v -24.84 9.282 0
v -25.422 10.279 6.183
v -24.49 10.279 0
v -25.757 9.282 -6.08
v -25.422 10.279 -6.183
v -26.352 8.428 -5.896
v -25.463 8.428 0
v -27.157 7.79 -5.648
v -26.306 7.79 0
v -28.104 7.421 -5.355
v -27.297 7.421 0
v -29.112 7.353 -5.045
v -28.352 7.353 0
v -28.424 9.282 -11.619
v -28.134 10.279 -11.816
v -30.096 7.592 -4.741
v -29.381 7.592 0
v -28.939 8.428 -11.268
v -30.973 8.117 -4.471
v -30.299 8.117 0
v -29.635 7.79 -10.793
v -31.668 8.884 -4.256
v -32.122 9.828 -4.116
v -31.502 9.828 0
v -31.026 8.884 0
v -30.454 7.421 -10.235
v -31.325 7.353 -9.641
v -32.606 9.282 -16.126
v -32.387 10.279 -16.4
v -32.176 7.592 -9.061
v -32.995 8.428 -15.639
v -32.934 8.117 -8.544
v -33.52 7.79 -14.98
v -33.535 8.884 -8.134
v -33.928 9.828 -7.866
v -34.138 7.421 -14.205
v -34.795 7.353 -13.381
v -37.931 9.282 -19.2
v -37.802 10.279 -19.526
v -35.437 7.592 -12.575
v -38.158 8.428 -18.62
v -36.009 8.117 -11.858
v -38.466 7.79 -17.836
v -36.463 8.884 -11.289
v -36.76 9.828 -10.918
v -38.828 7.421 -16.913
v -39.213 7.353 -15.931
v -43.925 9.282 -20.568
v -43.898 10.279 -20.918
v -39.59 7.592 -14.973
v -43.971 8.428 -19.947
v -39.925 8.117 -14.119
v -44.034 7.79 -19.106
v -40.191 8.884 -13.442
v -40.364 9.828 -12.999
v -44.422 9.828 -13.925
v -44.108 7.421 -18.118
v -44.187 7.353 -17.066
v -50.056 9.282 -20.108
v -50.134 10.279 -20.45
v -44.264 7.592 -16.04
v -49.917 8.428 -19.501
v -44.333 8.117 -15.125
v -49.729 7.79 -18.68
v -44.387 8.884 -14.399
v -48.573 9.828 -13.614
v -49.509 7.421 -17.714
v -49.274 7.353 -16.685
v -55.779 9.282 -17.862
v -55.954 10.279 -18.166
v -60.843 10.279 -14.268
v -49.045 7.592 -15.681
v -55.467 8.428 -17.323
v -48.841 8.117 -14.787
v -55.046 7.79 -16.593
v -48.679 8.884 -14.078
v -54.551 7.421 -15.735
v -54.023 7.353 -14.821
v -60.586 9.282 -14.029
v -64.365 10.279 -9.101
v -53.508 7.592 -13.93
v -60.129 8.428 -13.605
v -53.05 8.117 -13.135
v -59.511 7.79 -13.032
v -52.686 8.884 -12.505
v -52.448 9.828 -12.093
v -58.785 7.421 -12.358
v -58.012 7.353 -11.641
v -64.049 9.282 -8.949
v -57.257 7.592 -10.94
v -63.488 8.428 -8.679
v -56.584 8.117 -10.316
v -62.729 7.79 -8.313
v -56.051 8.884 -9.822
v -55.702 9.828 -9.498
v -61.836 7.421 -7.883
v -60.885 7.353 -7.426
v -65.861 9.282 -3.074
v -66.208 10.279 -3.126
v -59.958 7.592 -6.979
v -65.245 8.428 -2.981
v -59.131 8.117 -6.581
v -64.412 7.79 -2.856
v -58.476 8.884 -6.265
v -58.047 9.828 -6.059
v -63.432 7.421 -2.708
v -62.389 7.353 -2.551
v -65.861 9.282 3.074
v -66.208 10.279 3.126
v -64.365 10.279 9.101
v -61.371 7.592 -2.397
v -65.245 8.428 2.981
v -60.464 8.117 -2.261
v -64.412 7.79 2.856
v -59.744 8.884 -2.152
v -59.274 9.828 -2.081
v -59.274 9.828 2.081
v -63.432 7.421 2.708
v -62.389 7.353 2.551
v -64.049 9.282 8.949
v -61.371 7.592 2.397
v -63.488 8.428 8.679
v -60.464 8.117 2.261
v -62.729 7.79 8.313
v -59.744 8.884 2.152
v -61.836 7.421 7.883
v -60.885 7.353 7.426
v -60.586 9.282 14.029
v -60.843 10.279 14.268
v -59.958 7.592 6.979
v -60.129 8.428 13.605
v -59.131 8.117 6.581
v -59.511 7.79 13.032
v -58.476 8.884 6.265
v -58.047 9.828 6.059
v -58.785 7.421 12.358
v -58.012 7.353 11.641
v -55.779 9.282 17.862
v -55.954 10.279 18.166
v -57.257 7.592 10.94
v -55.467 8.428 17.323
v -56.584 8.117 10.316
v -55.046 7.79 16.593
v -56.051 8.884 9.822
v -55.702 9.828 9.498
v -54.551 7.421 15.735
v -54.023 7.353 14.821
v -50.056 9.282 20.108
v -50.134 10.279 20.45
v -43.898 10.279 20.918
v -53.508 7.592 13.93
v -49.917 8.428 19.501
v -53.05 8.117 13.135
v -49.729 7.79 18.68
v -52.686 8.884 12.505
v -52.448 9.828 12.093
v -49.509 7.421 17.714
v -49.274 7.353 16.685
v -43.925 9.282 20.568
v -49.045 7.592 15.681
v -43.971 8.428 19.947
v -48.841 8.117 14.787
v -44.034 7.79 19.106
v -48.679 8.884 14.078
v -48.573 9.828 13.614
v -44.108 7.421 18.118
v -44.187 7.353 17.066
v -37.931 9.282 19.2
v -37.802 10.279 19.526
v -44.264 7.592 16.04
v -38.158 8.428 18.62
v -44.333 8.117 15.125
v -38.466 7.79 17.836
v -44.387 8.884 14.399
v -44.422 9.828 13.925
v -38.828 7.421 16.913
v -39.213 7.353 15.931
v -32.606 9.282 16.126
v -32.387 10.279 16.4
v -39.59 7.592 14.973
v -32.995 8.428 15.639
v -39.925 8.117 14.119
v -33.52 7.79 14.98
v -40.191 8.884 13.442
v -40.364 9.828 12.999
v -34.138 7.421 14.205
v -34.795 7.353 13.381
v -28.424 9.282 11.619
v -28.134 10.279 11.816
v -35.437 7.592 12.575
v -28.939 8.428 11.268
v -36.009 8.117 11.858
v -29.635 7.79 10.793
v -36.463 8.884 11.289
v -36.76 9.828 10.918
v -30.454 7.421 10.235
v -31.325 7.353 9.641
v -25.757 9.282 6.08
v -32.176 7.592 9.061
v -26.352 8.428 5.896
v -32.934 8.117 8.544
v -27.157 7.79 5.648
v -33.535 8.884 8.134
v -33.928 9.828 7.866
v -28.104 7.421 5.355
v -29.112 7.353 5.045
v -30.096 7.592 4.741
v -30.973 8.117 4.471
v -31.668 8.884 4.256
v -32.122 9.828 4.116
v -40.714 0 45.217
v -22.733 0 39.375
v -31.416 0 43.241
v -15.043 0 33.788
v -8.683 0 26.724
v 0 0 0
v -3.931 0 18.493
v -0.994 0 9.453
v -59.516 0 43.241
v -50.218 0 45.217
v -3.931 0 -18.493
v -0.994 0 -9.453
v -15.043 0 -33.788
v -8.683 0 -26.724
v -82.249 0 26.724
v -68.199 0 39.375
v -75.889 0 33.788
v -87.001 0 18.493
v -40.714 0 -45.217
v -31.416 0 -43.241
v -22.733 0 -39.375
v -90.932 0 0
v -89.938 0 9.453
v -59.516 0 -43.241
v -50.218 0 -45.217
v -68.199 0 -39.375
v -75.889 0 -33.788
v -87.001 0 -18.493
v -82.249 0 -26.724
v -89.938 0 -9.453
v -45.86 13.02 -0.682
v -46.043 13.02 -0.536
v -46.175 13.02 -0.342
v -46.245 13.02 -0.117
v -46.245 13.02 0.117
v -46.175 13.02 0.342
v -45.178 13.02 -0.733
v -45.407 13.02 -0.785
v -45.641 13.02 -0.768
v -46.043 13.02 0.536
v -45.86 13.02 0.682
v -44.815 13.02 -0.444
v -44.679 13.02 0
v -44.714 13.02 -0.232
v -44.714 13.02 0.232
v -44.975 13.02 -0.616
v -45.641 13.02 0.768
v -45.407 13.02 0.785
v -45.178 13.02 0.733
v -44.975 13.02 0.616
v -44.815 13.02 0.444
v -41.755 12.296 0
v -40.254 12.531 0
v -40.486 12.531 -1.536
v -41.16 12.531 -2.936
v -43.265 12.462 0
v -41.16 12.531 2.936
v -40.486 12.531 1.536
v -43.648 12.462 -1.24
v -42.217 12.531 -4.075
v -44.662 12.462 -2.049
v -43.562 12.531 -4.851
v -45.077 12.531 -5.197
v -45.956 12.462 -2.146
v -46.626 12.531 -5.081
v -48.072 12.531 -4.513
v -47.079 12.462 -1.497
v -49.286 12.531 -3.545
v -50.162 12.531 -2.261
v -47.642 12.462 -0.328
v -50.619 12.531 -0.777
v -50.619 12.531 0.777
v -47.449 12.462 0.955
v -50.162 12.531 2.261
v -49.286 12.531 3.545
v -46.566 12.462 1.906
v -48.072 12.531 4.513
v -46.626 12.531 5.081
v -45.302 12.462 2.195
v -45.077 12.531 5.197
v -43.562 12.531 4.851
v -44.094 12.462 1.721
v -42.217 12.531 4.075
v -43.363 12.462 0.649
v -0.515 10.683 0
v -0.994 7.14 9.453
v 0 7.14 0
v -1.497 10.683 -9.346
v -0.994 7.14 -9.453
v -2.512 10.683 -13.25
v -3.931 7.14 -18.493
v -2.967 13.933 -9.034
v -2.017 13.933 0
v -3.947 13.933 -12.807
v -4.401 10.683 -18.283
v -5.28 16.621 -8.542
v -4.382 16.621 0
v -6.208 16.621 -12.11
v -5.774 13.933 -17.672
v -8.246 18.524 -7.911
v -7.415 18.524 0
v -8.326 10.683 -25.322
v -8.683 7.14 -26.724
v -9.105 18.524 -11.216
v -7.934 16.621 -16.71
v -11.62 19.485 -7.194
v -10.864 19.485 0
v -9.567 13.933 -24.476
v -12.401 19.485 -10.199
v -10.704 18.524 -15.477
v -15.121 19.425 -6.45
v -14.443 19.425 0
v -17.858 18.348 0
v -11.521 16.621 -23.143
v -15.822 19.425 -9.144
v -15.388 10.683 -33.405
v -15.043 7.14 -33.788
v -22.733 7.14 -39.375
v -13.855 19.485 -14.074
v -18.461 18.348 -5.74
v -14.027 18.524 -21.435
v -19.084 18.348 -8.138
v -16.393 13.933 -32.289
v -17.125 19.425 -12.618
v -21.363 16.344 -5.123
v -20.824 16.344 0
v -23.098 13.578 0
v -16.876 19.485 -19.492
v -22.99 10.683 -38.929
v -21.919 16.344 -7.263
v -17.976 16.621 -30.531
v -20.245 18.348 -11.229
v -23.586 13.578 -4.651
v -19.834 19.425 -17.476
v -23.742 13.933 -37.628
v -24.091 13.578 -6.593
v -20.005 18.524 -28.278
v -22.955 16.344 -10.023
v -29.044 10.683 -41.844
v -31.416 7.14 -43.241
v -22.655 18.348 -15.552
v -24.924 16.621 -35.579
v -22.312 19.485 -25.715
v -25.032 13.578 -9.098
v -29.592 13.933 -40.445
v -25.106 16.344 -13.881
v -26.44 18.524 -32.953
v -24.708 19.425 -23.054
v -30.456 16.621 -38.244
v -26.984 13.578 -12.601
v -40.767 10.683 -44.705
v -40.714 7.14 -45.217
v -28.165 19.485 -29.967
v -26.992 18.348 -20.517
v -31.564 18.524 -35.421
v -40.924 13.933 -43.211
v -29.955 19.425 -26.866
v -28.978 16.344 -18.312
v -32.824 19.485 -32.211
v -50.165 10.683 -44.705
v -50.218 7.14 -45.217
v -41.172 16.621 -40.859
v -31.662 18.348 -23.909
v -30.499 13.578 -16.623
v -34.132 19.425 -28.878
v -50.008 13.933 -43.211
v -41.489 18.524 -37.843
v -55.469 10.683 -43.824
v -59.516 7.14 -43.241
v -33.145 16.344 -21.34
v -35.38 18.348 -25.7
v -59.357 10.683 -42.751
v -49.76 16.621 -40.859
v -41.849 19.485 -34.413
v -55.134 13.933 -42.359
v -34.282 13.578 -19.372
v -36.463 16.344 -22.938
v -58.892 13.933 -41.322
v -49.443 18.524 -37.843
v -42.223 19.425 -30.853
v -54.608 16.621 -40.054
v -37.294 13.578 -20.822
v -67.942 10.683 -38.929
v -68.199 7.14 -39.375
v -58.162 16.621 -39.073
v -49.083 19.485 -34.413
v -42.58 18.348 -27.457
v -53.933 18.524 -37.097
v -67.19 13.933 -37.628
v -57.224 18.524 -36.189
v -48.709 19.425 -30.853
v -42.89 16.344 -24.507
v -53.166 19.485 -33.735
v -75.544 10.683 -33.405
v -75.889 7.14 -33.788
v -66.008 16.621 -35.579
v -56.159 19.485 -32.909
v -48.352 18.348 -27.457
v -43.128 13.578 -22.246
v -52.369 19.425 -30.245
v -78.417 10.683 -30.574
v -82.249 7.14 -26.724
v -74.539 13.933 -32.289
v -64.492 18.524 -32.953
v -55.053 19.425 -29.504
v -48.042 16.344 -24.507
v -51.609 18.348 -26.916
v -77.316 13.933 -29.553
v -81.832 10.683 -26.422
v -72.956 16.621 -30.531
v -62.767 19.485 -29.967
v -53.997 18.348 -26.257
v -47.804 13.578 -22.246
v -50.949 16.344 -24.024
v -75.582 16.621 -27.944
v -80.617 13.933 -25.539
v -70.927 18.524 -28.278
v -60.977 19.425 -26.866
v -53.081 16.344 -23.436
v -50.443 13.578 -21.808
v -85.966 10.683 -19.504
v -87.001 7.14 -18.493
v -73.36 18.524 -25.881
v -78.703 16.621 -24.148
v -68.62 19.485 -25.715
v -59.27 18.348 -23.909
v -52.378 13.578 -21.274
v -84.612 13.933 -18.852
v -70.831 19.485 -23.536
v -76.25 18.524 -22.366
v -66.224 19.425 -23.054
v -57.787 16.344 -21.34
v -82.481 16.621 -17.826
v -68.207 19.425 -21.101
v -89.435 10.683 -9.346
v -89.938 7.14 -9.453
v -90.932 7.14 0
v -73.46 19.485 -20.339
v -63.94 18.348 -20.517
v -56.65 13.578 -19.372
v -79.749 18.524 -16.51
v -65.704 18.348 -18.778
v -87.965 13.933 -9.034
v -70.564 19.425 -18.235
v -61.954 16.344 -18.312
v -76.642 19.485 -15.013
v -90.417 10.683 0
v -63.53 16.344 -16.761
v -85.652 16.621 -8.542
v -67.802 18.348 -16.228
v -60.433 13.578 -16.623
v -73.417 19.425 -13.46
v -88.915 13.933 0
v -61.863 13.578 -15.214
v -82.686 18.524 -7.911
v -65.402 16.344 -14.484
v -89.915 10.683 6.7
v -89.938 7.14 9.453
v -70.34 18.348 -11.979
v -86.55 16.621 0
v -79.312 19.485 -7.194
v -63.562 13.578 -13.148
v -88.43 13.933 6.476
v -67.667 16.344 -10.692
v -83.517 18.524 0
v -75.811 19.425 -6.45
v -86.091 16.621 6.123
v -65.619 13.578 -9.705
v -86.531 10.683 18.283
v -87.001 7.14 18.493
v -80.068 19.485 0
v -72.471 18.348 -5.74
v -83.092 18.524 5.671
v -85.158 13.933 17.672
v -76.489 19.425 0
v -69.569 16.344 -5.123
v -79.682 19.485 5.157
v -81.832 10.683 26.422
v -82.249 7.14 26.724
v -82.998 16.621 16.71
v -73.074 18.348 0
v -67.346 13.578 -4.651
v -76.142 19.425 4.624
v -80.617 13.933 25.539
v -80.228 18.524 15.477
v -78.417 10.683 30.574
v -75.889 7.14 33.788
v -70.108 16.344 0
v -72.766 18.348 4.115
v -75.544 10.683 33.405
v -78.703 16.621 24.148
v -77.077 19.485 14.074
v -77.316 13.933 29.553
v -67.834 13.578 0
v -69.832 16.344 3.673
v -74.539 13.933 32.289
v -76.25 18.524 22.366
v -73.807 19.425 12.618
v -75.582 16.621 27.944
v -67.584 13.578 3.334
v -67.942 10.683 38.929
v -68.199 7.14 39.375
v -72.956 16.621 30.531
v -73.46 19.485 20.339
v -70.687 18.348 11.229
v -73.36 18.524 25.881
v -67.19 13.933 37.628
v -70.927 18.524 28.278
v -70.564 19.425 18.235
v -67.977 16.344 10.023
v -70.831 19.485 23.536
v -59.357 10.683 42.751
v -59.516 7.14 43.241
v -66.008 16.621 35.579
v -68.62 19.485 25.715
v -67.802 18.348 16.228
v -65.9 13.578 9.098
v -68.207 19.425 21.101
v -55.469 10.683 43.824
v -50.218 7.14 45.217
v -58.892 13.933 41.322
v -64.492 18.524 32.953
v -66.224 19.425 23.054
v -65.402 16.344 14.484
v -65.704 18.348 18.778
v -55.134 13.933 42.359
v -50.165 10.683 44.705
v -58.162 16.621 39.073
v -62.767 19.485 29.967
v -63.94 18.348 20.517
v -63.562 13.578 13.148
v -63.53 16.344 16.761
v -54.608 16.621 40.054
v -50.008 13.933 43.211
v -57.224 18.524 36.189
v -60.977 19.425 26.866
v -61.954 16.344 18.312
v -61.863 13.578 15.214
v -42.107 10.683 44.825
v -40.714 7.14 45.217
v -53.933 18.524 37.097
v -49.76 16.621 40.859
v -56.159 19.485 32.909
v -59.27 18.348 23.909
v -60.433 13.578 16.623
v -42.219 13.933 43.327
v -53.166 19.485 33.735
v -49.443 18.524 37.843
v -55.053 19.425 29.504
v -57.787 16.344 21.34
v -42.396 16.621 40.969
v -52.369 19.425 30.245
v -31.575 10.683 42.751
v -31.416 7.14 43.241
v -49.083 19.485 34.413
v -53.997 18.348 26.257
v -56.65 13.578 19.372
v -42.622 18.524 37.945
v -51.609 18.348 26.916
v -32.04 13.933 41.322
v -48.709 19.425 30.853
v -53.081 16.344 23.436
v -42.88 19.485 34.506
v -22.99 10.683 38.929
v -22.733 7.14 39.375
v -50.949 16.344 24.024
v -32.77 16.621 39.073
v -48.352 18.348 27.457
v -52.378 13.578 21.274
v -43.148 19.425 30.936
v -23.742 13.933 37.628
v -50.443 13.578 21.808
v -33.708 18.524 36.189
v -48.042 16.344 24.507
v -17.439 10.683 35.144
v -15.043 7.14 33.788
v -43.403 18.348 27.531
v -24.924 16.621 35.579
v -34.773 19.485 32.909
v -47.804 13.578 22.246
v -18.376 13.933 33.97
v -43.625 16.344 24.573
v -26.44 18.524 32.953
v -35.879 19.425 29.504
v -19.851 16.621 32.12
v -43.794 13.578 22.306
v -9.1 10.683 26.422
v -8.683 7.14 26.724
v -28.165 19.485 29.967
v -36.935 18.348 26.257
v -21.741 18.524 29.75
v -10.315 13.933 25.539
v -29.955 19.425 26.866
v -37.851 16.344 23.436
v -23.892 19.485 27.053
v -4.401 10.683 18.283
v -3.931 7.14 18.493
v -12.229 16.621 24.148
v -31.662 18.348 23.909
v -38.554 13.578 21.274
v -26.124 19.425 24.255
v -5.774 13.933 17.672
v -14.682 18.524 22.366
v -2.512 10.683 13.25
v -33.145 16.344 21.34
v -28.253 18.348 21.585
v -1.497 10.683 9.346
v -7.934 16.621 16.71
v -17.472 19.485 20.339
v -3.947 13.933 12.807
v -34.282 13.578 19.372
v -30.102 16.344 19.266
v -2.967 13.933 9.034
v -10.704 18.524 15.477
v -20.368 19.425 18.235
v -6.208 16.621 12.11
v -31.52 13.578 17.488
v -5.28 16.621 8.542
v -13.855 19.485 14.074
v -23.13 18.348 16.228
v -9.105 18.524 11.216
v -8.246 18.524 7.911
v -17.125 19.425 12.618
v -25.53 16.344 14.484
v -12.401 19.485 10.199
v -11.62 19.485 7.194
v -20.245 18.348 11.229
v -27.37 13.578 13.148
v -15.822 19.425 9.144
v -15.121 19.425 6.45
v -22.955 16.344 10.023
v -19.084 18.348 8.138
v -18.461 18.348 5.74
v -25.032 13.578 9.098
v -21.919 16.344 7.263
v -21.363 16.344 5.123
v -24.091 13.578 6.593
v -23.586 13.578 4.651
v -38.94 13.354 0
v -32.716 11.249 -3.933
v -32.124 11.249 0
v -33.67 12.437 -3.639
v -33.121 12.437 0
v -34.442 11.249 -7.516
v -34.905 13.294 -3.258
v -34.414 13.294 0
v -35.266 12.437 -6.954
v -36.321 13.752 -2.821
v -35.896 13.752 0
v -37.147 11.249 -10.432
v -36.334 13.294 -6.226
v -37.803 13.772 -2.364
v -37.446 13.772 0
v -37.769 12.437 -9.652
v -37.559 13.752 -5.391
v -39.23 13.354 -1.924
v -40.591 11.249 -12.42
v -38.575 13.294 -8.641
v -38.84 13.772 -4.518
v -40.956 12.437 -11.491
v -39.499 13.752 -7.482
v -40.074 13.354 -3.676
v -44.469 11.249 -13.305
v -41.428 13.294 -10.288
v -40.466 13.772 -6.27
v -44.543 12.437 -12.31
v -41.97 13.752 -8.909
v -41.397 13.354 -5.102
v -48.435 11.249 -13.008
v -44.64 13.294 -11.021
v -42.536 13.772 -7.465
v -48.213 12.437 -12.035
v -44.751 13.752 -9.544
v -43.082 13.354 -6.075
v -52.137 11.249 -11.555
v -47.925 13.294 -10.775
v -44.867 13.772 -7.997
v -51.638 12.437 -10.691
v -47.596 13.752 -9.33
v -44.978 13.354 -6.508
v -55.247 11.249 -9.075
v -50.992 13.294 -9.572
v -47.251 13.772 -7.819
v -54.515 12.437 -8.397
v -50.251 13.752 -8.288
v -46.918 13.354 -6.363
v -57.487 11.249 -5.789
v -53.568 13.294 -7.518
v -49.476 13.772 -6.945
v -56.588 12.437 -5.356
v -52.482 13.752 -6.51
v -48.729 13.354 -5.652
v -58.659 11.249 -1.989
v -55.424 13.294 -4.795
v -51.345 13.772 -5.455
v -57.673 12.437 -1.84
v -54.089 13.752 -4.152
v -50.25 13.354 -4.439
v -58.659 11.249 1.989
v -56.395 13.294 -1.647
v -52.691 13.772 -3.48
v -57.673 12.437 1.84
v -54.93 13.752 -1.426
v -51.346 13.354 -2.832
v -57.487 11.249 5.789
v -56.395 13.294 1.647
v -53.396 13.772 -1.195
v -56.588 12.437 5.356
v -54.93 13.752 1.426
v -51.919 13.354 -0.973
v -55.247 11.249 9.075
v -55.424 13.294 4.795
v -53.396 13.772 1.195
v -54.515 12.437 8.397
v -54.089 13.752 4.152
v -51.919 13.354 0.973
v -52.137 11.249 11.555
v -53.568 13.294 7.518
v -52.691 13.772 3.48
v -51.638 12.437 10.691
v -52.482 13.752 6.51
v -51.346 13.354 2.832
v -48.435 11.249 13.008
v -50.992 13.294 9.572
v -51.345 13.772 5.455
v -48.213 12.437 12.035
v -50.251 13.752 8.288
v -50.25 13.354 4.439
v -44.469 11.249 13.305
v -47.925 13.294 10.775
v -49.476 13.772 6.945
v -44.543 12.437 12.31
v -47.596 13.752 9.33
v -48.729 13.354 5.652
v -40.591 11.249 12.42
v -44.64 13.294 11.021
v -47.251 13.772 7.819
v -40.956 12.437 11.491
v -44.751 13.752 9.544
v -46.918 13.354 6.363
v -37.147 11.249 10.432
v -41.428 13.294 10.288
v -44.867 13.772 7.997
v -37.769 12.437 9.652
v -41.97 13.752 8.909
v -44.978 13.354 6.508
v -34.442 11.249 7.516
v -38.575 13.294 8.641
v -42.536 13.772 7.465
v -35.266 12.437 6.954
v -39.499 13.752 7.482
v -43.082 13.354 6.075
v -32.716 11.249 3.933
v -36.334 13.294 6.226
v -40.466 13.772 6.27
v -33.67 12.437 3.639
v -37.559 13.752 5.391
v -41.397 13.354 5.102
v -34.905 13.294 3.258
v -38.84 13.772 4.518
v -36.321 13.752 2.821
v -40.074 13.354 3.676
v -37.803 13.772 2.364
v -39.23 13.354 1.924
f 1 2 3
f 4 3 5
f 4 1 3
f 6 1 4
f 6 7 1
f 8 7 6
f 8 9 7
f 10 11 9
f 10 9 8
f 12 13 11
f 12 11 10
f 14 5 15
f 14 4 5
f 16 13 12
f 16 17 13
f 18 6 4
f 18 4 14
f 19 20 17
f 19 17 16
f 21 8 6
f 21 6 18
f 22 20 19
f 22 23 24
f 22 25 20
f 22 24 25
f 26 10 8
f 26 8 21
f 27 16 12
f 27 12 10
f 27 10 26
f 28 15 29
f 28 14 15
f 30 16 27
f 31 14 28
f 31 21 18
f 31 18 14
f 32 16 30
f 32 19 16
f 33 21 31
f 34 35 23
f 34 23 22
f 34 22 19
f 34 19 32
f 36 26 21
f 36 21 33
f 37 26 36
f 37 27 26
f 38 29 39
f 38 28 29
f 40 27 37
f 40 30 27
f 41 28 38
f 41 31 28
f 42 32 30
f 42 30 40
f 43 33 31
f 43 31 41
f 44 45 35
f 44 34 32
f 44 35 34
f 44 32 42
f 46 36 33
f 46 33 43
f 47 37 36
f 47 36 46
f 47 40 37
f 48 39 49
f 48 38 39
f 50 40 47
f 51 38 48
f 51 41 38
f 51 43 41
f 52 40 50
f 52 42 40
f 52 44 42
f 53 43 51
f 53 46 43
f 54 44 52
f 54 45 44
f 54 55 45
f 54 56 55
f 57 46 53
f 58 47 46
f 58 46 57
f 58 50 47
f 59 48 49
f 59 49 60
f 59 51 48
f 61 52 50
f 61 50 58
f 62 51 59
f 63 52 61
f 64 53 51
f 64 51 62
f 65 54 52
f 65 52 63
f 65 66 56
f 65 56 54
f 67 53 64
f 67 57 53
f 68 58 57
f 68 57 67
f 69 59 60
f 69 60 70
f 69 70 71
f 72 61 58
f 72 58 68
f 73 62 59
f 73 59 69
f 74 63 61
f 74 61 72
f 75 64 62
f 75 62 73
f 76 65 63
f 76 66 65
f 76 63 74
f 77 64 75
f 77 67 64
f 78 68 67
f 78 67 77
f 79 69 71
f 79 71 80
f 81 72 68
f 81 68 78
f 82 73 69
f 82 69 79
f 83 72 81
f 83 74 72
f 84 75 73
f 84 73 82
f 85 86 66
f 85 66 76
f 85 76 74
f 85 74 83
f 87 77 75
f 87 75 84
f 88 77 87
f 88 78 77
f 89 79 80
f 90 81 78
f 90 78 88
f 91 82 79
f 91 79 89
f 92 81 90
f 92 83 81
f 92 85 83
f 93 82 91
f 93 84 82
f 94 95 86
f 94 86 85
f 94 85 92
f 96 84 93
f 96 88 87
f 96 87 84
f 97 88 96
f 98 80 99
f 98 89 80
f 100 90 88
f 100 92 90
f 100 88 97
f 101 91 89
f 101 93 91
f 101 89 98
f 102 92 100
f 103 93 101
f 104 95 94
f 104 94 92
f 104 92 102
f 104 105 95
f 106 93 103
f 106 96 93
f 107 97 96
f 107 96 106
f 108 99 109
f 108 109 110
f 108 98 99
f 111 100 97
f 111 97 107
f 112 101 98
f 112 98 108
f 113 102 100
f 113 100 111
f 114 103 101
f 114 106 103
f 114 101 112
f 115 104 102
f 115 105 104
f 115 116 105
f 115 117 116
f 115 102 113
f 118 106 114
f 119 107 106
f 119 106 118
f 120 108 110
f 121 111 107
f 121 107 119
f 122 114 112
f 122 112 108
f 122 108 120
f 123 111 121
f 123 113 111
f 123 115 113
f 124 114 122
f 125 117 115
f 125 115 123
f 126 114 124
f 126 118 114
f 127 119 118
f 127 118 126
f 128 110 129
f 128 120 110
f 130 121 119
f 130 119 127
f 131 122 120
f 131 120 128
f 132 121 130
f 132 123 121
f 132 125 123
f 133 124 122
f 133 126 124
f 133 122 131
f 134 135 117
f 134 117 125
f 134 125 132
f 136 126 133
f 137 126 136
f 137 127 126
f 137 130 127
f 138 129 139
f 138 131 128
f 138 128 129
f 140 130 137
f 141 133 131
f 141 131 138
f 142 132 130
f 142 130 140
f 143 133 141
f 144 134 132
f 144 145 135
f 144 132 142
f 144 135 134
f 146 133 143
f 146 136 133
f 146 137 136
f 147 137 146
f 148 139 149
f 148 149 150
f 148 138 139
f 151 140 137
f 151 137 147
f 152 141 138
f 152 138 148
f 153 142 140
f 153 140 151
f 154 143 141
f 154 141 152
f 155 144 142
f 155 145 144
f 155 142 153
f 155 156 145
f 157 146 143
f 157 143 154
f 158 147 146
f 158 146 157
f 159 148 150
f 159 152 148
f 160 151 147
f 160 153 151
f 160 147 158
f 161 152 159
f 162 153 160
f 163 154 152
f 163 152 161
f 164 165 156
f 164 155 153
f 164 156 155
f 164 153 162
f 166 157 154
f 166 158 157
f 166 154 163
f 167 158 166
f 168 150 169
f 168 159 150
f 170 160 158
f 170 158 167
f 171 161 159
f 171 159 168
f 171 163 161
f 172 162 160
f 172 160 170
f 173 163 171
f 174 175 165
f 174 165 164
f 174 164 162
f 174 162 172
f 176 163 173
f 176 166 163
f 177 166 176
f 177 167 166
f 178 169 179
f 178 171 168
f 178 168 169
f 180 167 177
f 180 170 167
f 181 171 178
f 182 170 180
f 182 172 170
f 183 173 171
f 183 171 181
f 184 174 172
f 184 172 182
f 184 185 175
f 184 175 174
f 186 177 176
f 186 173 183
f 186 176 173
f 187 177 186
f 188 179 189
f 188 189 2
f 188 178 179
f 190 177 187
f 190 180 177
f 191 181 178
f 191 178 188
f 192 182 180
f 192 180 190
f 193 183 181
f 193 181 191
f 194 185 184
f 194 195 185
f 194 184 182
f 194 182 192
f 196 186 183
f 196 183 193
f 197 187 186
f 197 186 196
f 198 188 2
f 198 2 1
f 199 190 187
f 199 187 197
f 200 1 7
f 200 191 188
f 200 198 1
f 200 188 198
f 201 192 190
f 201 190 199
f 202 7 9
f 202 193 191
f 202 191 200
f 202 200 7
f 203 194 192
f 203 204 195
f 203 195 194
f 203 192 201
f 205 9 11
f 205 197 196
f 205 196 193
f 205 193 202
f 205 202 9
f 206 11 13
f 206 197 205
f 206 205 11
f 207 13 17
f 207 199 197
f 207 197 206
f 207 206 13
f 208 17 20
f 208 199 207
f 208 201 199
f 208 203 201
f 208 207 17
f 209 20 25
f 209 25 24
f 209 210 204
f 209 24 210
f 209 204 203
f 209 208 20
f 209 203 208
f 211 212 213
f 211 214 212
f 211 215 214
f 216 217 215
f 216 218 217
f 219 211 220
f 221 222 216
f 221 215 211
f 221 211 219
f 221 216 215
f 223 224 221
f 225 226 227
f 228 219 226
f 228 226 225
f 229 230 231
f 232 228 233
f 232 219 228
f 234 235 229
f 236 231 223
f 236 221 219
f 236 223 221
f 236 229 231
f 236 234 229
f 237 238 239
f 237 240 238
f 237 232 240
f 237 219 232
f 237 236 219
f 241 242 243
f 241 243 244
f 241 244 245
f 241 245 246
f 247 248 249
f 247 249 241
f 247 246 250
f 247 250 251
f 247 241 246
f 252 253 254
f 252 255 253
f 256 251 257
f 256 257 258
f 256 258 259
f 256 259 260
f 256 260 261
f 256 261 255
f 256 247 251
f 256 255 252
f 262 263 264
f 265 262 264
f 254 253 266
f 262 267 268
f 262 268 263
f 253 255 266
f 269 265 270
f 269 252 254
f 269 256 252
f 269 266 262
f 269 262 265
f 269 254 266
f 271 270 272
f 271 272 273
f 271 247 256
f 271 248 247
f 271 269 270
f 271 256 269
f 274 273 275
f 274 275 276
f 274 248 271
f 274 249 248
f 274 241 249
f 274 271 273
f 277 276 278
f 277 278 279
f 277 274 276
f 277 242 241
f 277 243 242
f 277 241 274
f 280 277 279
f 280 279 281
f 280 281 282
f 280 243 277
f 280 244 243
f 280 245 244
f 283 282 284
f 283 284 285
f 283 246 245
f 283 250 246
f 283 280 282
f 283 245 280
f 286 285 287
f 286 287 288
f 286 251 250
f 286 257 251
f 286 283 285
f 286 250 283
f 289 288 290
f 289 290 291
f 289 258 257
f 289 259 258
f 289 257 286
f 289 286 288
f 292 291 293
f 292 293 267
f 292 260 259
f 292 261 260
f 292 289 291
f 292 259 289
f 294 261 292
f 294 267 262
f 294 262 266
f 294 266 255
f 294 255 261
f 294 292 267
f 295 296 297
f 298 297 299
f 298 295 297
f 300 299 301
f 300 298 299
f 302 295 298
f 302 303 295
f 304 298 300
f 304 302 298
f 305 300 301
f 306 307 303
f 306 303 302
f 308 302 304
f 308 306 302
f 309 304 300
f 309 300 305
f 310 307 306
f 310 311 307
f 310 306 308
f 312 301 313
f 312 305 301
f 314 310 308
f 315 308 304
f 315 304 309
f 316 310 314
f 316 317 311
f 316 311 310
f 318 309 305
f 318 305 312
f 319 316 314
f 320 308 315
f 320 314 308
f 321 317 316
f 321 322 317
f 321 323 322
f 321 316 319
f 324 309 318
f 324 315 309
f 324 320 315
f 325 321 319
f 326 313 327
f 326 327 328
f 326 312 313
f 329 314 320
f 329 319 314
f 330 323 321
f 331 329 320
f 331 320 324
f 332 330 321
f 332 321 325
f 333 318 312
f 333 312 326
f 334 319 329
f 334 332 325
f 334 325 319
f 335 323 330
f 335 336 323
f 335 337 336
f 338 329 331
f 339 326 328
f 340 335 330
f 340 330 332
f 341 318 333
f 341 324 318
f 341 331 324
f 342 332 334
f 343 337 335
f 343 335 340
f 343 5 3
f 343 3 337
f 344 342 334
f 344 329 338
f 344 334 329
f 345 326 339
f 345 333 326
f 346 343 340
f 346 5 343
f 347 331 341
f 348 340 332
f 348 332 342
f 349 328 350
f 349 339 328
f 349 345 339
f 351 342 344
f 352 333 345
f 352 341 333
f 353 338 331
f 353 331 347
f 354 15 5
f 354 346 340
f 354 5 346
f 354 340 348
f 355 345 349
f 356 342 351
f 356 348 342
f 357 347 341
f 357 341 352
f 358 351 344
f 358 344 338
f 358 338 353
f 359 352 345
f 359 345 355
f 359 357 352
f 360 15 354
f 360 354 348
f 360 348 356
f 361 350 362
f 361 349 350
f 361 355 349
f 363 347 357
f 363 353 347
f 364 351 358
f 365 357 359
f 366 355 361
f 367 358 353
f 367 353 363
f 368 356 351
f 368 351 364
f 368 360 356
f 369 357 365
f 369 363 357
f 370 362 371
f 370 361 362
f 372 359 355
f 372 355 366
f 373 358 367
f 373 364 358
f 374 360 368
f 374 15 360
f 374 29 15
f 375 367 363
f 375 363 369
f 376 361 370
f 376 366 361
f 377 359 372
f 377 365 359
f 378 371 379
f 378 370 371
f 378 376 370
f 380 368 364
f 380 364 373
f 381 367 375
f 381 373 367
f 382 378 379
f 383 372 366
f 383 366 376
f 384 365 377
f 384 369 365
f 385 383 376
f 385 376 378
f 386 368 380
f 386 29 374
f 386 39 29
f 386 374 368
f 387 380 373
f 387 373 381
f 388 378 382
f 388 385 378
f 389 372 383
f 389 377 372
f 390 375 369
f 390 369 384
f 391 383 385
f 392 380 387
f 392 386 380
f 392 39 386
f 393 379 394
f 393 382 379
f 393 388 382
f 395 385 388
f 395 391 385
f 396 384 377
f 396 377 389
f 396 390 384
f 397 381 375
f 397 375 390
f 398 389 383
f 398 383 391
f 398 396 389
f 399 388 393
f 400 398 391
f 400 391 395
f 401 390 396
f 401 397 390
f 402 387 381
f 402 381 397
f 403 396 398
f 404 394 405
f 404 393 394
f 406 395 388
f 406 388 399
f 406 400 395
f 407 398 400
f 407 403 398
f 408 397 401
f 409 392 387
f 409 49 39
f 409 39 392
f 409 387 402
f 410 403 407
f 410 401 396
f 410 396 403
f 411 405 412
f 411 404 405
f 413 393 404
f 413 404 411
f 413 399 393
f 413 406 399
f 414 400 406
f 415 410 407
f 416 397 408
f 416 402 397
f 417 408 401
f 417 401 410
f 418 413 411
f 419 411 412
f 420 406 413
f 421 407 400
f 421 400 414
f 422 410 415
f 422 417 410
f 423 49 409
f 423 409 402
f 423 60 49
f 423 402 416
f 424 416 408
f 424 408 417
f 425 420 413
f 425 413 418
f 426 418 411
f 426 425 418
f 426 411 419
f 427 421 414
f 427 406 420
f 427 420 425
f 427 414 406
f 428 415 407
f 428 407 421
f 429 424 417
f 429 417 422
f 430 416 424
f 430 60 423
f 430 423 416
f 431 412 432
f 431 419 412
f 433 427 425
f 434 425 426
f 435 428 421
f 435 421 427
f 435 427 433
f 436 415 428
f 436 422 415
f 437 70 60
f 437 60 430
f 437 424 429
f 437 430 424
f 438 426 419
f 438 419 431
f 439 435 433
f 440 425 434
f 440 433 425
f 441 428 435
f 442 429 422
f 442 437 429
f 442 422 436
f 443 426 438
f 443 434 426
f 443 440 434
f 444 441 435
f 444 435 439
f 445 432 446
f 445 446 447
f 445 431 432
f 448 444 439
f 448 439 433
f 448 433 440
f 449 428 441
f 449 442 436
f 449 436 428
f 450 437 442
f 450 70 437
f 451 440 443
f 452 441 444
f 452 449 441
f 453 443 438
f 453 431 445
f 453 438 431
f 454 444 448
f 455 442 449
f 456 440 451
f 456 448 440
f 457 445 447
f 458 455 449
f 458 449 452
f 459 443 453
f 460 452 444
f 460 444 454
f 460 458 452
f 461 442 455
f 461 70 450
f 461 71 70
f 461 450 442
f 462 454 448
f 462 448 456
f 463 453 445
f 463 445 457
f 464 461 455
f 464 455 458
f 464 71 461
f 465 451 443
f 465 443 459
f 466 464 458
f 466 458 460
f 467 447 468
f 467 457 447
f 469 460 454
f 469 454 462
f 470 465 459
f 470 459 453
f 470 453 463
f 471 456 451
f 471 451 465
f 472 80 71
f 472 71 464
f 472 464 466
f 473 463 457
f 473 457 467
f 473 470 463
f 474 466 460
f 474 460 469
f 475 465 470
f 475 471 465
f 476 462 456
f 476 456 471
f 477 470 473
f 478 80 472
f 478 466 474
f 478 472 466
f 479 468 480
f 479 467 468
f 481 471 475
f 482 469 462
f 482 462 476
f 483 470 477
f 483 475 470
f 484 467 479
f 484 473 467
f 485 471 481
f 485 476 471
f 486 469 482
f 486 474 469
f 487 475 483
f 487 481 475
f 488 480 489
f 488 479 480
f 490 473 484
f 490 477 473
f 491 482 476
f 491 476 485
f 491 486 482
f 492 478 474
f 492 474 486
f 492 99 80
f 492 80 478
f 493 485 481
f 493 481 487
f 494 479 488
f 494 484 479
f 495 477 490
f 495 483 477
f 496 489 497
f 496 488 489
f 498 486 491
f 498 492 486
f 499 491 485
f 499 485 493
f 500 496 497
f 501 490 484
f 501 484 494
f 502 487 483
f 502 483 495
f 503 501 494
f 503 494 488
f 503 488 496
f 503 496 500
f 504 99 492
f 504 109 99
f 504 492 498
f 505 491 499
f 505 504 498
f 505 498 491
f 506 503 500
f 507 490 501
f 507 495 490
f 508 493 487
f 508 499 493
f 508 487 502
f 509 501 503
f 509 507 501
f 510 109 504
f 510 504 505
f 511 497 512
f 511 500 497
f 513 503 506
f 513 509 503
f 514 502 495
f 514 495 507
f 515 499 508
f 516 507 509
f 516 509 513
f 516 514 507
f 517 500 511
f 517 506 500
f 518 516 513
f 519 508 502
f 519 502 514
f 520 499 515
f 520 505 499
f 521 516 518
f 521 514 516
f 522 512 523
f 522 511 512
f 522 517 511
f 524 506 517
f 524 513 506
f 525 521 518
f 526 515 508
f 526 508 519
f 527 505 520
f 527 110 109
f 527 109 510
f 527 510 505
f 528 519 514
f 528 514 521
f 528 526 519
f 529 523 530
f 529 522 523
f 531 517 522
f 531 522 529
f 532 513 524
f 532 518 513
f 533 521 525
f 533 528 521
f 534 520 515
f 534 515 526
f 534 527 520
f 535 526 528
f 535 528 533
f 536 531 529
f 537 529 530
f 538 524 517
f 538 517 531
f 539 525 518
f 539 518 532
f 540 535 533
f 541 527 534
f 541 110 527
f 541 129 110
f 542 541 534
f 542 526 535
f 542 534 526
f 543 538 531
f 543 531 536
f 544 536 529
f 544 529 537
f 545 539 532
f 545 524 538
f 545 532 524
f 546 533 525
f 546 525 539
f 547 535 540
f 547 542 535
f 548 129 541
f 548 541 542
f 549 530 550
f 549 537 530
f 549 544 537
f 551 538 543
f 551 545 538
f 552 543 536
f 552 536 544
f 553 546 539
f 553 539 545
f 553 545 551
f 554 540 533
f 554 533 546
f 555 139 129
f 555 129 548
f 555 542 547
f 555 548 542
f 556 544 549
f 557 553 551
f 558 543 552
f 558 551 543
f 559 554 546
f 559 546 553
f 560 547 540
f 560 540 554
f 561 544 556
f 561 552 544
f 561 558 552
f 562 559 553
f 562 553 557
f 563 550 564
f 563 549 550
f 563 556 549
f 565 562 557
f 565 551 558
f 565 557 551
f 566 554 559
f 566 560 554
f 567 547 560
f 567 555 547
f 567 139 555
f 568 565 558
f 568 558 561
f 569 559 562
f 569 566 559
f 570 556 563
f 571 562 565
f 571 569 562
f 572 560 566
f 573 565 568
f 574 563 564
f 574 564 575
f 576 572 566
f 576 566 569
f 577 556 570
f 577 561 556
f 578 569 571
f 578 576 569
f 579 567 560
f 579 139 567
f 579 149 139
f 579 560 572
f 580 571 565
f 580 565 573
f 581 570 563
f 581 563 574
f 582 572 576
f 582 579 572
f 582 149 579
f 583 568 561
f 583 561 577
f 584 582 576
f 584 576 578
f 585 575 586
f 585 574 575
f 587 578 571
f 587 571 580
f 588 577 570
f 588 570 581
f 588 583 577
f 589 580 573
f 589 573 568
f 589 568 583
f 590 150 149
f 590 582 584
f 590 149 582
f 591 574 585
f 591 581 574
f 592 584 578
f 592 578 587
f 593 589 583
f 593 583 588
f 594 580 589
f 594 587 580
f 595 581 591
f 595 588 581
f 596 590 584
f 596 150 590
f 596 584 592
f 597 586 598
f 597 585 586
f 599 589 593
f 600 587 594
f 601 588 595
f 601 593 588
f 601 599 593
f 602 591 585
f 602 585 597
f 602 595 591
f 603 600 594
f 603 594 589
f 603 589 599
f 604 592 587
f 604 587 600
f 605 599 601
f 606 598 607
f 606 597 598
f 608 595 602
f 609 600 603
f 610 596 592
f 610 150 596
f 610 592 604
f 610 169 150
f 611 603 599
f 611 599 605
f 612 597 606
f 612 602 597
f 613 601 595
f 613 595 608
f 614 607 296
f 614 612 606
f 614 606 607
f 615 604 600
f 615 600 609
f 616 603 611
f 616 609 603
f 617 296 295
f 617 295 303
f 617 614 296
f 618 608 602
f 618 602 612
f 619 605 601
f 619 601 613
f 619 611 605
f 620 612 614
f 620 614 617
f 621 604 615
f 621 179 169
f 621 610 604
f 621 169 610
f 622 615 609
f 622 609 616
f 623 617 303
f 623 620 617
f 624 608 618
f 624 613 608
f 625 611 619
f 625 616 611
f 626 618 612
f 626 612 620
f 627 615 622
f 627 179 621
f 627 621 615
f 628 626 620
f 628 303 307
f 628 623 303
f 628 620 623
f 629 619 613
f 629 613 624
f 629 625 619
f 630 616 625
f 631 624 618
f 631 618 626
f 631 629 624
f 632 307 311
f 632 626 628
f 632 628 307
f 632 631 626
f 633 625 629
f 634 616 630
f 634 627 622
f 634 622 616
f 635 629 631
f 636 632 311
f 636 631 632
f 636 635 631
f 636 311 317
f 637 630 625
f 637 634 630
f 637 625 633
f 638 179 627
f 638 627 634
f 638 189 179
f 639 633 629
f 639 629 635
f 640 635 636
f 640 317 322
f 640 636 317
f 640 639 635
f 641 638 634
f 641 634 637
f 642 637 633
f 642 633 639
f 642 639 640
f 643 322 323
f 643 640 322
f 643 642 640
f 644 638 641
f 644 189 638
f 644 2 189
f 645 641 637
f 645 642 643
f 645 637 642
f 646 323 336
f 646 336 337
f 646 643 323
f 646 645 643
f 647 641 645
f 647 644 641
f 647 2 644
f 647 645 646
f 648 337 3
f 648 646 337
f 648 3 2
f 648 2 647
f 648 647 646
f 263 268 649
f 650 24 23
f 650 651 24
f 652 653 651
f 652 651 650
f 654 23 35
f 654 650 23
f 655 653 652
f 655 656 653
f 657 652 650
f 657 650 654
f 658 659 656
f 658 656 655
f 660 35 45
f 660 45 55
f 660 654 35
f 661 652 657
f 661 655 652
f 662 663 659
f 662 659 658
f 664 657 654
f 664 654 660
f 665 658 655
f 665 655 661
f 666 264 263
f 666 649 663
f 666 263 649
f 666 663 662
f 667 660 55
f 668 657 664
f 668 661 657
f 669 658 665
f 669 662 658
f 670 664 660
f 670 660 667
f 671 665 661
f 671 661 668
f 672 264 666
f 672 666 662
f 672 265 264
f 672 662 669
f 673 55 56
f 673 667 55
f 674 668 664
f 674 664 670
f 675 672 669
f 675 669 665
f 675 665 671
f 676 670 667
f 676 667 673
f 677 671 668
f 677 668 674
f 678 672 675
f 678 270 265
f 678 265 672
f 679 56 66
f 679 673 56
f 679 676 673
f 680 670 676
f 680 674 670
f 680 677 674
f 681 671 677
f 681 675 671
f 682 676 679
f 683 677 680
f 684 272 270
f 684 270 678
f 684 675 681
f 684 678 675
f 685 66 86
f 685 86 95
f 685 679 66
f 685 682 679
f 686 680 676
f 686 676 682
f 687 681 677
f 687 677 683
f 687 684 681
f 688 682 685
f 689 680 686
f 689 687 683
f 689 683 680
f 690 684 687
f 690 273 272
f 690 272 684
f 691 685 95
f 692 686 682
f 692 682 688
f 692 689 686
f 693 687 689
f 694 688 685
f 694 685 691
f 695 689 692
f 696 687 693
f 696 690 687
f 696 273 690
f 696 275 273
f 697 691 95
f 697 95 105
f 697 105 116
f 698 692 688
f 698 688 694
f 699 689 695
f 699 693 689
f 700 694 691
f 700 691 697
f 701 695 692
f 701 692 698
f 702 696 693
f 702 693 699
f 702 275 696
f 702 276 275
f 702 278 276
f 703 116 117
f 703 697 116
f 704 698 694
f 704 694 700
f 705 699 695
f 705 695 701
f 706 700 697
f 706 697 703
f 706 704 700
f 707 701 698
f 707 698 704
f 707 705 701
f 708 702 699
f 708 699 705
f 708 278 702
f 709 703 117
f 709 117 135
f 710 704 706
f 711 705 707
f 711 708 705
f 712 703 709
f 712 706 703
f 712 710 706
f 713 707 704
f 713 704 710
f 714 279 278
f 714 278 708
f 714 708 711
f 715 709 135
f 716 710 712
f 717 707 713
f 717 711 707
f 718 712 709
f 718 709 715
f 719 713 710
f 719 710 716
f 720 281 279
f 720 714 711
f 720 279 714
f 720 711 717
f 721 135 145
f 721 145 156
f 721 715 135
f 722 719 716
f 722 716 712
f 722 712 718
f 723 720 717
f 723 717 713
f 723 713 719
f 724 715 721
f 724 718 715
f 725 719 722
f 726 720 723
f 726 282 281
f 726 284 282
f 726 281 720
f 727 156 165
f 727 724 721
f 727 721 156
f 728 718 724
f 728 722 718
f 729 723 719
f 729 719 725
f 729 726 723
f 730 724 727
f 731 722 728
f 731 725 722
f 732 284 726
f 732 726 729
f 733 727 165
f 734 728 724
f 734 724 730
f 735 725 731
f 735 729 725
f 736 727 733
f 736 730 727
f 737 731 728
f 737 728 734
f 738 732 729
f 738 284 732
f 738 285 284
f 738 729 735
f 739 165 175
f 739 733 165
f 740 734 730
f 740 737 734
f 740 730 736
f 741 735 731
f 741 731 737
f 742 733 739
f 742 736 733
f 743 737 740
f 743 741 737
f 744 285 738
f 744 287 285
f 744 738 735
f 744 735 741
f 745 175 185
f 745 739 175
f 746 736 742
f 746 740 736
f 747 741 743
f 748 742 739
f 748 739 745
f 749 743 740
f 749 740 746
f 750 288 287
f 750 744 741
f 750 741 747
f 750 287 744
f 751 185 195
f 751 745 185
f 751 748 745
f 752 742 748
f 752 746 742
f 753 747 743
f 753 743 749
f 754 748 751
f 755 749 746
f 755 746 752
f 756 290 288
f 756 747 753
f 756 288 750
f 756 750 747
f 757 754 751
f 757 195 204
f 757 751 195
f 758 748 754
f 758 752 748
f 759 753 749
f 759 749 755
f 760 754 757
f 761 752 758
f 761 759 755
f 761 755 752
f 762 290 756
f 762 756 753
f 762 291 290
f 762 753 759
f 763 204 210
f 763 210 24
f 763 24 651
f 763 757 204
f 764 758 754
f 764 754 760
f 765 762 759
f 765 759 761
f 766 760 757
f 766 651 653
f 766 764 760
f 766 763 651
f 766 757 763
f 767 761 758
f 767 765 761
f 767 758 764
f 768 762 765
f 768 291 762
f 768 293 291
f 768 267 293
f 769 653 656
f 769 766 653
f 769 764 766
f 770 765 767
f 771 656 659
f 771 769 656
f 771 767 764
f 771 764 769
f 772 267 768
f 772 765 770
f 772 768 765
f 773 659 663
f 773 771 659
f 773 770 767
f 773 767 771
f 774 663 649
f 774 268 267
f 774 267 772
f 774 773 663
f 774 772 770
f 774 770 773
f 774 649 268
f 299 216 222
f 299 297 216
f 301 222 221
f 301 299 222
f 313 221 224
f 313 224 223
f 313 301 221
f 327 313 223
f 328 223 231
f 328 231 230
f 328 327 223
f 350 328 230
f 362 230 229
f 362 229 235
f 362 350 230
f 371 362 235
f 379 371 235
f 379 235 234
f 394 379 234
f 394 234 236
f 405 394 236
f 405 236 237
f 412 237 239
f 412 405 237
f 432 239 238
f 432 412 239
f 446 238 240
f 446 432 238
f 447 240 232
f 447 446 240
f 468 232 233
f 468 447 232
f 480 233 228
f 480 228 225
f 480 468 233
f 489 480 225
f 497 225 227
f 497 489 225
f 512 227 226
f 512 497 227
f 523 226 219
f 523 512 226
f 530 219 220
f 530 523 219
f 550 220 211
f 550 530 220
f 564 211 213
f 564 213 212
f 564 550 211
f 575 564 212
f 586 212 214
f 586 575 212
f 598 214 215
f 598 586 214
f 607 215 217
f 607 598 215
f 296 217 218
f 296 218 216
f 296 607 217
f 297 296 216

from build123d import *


with BuildPart() as part:
    # Sketch1 → Revolve1 (revolve)
    with BuildSketch(Plane.XY):
        with BuildLine():
            Line((0, 0), (0, 7.14024037))
            ThreePointArc((0, 7.14024037), (-10.863552097, 19.485230229), (-24.489599009, 10.279450287))
            ThreePointArc((-24.489599009, 10.279450287), (-27.821731607, 7.348582007), (-31.501935722, 9.82833889))
            ThreePointArc((-31.501935722, 9.82833889), (-35.138176859, 13.576179652), (-40.254364407, 12.530624802))
            ThreePointArc((-40.254364407, 12.530624802), (-42.51580515, 12.328830241), (-44.6786, 13.019593379))
            Line((-44.6786, 13.019593379), (-45.466, 13.019593379))
            Line((-45.466, 13.019593379), (-45.466, 0))
            Line((-45.466, 0), (0, 0))
        make_face()
    revolve(axis=Axis((-45.466, 0, 0), (0, 1, 0)))


solid = part.part
